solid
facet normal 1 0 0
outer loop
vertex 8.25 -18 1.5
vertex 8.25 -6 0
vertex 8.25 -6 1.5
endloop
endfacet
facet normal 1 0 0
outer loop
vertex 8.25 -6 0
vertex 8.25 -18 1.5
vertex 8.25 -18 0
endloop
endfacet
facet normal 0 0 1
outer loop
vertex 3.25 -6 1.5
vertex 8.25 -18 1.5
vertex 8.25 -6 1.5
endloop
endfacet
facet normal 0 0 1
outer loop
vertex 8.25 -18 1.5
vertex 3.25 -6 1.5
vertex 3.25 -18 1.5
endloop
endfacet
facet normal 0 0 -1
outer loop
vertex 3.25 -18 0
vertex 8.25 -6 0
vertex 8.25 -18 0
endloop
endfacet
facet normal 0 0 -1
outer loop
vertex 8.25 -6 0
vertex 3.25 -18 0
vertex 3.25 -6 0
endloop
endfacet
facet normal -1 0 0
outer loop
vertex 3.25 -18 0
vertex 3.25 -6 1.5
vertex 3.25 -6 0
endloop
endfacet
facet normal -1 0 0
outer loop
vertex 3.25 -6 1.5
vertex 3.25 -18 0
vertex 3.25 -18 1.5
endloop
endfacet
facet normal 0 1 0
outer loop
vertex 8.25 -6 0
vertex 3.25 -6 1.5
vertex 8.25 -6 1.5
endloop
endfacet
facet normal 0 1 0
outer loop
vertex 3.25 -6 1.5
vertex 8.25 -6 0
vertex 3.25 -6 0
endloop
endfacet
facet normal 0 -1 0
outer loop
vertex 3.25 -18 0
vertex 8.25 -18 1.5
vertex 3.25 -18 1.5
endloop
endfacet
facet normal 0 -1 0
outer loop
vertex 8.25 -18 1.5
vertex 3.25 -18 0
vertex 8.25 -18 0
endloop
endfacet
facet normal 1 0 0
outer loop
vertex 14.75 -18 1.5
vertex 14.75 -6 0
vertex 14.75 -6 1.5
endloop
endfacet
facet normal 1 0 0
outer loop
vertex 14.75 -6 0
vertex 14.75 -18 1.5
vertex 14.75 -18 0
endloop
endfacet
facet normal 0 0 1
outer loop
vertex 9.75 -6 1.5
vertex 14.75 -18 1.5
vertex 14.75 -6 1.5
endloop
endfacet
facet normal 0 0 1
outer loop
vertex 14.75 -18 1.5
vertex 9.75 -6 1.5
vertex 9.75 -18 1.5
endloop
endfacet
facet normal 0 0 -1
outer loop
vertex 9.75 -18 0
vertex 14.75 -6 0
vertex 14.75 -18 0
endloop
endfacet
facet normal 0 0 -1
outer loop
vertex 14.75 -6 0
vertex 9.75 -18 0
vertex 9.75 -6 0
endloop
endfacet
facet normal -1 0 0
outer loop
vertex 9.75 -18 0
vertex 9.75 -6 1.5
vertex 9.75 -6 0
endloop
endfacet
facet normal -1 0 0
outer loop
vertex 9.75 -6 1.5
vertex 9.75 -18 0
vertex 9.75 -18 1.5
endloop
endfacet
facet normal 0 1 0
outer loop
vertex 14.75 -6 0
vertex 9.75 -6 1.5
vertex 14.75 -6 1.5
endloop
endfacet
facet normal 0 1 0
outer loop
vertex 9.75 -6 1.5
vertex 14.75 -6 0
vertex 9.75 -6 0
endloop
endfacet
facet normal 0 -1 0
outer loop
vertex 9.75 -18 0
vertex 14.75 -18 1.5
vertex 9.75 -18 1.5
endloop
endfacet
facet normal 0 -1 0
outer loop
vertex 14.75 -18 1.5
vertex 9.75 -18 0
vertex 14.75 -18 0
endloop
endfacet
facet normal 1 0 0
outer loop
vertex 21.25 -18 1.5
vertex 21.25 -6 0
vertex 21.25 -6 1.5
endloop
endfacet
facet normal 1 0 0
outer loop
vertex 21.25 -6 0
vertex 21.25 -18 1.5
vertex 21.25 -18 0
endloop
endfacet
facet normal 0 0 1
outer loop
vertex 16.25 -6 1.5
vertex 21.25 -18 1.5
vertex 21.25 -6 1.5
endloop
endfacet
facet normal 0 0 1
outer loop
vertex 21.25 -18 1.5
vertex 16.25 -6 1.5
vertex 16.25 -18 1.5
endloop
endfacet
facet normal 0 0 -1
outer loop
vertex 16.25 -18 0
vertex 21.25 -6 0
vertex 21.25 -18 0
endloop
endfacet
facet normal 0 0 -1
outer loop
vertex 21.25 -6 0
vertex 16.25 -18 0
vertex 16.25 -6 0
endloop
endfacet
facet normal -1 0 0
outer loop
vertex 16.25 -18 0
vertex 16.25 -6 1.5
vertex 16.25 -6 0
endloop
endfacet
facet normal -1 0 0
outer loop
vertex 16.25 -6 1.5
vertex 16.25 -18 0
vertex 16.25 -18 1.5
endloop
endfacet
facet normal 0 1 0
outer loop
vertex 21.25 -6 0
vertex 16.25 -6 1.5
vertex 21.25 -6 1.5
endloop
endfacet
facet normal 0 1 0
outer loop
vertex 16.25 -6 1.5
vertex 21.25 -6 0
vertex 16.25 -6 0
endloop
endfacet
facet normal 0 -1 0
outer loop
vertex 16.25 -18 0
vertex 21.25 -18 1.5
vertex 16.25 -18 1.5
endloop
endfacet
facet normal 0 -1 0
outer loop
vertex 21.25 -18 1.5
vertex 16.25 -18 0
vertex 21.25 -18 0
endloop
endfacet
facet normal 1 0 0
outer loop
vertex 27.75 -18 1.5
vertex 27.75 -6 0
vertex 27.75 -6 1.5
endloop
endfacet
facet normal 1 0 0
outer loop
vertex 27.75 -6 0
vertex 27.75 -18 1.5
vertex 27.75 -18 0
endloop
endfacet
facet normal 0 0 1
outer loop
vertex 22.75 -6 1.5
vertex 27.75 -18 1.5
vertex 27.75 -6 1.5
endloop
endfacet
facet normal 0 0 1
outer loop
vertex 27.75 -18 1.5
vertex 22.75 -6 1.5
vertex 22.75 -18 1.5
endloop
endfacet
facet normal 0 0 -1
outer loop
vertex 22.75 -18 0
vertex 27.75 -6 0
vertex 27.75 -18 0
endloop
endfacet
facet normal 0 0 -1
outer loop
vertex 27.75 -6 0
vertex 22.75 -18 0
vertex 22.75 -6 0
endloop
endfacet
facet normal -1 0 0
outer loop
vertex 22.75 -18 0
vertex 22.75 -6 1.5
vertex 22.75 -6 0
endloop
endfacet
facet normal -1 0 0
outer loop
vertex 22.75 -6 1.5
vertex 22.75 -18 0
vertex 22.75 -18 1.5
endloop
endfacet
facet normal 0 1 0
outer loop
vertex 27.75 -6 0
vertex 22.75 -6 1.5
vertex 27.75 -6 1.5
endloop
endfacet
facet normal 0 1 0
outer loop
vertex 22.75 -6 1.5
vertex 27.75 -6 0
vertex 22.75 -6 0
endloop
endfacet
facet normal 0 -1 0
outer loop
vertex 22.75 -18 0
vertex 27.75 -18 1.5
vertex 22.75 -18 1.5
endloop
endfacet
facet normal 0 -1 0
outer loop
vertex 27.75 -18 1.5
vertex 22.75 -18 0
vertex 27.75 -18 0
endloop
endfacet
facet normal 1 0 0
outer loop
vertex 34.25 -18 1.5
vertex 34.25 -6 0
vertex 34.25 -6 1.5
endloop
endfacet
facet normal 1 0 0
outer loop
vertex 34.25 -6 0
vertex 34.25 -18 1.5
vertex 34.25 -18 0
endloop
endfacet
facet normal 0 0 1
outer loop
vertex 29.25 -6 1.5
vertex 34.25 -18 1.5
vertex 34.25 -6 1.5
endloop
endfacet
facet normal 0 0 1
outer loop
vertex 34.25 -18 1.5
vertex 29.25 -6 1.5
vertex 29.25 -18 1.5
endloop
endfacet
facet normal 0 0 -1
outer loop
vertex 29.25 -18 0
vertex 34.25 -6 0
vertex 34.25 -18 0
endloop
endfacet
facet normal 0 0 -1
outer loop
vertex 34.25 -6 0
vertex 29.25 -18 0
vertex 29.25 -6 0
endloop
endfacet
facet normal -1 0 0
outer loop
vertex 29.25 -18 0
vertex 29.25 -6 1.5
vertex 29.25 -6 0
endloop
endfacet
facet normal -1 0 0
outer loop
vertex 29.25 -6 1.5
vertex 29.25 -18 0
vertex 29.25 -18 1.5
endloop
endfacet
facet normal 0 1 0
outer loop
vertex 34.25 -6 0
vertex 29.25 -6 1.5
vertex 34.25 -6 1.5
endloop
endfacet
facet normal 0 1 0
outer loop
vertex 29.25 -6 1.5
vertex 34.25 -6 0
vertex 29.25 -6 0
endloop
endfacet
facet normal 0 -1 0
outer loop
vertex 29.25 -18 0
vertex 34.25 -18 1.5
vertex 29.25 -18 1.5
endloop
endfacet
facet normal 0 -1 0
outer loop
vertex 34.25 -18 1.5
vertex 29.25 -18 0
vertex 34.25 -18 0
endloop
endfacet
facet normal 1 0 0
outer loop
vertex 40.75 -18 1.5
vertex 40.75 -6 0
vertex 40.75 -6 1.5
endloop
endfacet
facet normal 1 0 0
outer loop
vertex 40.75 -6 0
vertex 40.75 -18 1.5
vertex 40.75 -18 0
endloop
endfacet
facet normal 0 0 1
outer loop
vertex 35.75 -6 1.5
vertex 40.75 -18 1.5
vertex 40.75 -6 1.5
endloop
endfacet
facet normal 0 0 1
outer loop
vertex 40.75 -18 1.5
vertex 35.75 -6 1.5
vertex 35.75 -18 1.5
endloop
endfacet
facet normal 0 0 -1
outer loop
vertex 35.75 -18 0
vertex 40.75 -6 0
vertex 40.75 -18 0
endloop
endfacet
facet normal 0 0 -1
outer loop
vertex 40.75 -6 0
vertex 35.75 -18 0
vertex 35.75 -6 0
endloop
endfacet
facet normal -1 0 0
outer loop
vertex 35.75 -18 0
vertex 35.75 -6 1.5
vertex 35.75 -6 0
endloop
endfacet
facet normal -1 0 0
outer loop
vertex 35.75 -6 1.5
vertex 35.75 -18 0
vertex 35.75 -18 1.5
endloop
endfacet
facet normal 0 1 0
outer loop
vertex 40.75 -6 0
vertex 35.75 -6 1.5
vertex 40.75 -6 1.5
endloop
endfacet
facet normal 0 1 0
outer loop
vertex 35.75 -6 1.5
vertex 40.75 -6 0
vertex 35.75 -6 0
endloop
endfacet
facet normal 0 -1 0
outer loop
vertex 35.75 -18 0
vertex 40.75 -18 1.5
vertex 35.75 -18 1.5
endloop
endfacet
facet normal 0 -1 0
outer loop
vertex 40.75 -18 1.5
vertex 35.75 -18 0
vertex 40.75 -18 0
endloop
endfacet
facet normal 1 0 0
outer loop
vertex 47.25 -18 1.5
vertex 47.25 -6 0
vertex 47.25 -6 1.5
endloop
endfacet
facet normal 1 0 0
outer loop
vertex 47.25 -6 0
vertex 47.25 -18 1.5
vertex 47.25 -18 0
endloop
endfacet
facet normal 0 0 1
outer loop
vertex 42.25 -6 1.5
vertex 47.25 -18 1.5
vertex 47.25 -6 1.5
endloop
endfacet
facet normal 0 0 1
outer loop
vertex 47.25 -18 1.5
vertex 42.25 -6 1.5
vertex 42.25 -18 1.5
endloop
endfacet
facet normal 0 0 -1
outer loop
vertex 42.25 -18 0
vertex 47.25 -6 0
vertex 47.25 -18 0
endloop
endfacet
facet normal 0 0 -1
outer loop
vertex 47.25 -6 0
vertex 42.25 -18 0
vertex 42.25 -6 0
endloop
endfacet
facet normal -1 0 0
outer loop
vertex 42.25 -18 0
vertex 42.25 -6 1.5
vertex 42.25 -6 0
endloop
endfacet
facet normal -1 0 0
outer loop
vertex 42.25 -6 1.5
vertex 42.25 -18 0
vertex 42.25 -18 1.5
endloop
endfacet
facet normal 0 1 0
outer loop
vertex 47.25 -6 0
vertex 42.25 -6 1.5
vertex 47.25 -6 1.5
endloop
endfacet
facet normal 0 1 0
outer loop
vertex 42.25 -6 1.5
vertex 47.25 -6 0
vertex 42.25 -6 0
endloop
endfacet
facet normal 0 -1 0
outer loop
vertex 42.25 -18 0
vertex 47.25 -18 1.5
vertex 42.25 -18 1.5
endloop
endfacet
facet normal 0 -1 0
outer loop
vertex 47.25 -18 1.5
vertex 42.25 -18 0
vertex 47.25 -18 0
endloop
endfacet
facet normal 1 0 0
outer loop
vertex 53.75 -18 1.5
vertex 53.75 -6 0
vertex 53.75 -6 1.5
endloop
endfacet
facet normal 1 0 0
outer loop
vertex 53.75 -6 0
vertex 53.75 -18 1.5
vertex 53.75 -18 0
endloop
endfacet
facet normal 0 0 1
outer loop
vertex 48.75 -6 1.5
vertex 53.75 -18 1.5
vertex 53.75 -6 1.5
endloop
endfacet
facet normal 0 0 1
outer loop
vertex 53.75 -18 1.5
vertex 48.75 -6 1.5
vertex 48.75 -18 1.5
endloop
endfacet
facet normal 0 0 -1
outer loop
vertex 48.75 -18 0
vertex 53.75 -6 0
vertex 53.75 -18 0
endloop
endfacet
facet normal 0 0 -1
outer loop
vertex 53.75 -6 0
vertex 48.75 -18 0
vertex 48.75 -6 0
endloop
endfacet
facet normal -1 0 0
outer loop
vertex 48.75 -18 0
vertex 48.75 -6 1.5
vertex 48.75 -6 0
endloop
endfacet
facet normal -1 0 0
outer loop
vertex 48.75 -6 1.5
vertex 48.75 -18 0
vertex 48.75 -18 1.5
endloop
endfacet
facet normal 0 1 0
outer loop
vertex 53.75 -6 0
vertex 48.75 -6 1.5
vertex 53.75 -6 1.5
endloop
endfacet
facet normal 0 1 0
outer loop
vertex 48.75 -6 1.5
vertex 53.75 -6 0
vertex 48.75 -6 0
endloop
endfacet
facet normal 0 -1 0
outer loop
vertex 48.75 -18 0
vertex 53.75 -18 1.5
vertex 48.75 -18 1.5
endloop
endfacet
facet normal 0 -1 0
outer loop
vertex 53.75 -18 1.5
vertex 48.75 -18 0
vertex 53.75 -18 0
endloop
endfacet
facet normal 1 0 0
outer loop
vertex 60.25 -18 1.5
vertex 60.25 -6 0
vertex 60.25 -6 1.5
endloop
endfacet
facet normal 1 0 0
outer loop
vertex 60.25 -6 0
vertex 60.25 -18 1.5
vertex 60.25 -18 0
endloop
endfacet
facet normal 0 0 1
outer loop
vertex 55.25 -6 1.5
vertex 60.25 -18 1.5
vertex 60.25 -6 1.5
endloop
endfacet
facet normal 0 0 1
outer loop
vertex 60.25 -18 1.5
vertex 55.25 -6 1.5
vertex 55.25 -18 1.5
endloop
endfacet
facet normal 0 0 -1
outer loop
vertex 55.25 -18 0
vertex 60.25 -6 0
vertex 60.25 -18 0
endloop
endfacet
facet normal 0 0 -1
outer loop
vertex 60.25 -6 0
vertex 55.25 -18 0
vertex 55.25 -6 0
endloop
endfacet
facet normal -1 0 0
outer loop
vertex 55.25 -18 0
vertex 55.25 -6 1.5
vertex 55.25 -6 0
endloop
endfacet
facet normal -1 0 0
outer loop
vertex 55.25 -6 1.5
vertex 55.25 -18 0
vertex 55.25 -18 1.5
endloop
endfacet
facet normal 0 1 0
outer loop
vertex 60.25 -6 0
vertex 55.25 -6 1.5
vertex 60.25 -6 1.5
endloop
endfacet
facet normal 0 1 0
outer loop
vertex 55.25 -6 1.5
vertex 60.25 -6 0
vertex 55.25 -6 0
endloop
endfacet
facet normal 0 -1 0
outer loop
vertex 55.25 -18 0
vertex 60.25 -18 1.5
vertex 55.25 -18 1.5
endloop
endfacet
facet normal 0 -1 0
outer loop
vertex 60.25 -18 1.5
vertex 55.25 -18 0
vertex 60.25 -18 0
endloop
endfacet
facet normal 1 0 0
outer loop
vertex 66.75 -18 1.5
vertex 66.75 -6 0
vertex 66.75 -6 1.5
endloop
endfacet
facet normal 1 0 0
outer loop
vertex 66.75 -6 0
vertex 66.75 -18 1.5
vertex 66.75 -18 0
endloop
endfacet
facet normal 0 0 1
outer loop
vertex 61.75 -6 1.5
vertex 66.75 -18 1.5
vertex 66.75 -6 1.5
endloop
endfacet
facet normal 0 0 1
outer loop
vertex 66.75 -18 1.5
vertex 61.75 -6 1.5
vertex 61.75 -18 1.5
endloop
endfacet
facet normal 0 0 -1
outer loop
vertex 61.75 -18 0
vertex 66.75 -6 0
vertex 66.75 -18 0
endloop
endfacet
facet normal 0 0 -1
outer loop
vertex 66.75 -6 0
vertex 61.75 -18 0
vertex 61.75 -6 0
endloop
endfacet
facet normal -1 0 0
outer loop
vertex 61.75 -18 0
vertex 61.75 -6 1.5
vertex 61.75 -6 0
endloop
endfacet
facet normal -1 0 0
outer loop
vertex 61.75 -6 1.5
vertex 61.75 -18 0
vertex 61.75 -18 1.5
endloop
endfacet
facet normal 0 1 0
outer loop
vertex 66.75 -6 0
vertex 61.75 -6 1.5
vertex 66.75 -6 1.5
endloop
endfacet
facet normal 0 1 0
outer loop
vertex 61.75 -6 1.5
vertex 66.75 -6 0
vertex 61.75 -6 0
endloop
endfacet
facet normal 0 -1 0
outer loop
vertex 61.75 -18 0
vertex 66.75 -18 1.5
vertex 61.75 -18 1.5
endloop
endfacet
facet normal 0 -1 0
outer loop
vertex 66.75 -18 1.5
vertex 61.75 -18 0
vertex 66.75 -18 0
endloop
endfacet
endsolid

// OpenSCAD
// 10-well agarose gel comb
// Print orientation: lying flat on XY plane, z=0

// Overall plate dimensions
plate_thickness = 1.5;    // Z thickness (mm)
spine_length = 70;         // X length (mm)
spine_width = 12;          // Y width (mm)

// Tooth dimensions
tooth_width = 5.0;         // X width (mm)
tooth_length = 12;         // Y length (mm) (extends in -Y from spine edge)

// Gap between teeth
gap_width = 1.5;           // X gap (mm)

// Number of teeth
num_teeth = 10;

// Calculate total width of teeth + gaps
total_tooth_width = num_teeth * tooth_width;
total_gap_width = (num_teeth - 1) * gap_width;
total_tooth_group_width = total_tooth_width + total_gap_width;

// Center the tooth group on the spine in X
tooth_group_offset_x = (spine_length - total_tooth_group_width) / 2;

// Position of first tooth in X (relative to origin)
first_tooth_x = tooth_group_offset_x;

// Spine extends in +Y from center, teeth hang in -Y
// Spine Y range: [-spine_width/2, spine_width/2]
// Teeth start at spine bottom edge: y = -spine_width/2
// Teeth extend to: y = -spine_width/2 - tooth_length

$fn = 64;

difference() {
    // Main spine plate
    union() {
        // Spine body
        translate([0, 0, 0])
            cube([spine_length, spine_width, plate_thickness], center = false);
        
        // Add teeth
        for (i = [0 : num_teeth - 1]) {
            tooth_x = first_tooth_x + i * (tooth_width + gap_width);
            translate([tooth_x, -spine_width/2 - tooth_length, 0])
                cube([tooth_width, tooth_length, plate_thickness], center = false);
        }
    }
    
    // No cutting needed - this is a solid comb
    // Just ensure we have a valid solid
    translate([0, 0, -0.01])
        cube([spine_length + 0.02, spine_width + 2*tooth_length + 0.02, plate_thickness + 0.02], center = false);
}
